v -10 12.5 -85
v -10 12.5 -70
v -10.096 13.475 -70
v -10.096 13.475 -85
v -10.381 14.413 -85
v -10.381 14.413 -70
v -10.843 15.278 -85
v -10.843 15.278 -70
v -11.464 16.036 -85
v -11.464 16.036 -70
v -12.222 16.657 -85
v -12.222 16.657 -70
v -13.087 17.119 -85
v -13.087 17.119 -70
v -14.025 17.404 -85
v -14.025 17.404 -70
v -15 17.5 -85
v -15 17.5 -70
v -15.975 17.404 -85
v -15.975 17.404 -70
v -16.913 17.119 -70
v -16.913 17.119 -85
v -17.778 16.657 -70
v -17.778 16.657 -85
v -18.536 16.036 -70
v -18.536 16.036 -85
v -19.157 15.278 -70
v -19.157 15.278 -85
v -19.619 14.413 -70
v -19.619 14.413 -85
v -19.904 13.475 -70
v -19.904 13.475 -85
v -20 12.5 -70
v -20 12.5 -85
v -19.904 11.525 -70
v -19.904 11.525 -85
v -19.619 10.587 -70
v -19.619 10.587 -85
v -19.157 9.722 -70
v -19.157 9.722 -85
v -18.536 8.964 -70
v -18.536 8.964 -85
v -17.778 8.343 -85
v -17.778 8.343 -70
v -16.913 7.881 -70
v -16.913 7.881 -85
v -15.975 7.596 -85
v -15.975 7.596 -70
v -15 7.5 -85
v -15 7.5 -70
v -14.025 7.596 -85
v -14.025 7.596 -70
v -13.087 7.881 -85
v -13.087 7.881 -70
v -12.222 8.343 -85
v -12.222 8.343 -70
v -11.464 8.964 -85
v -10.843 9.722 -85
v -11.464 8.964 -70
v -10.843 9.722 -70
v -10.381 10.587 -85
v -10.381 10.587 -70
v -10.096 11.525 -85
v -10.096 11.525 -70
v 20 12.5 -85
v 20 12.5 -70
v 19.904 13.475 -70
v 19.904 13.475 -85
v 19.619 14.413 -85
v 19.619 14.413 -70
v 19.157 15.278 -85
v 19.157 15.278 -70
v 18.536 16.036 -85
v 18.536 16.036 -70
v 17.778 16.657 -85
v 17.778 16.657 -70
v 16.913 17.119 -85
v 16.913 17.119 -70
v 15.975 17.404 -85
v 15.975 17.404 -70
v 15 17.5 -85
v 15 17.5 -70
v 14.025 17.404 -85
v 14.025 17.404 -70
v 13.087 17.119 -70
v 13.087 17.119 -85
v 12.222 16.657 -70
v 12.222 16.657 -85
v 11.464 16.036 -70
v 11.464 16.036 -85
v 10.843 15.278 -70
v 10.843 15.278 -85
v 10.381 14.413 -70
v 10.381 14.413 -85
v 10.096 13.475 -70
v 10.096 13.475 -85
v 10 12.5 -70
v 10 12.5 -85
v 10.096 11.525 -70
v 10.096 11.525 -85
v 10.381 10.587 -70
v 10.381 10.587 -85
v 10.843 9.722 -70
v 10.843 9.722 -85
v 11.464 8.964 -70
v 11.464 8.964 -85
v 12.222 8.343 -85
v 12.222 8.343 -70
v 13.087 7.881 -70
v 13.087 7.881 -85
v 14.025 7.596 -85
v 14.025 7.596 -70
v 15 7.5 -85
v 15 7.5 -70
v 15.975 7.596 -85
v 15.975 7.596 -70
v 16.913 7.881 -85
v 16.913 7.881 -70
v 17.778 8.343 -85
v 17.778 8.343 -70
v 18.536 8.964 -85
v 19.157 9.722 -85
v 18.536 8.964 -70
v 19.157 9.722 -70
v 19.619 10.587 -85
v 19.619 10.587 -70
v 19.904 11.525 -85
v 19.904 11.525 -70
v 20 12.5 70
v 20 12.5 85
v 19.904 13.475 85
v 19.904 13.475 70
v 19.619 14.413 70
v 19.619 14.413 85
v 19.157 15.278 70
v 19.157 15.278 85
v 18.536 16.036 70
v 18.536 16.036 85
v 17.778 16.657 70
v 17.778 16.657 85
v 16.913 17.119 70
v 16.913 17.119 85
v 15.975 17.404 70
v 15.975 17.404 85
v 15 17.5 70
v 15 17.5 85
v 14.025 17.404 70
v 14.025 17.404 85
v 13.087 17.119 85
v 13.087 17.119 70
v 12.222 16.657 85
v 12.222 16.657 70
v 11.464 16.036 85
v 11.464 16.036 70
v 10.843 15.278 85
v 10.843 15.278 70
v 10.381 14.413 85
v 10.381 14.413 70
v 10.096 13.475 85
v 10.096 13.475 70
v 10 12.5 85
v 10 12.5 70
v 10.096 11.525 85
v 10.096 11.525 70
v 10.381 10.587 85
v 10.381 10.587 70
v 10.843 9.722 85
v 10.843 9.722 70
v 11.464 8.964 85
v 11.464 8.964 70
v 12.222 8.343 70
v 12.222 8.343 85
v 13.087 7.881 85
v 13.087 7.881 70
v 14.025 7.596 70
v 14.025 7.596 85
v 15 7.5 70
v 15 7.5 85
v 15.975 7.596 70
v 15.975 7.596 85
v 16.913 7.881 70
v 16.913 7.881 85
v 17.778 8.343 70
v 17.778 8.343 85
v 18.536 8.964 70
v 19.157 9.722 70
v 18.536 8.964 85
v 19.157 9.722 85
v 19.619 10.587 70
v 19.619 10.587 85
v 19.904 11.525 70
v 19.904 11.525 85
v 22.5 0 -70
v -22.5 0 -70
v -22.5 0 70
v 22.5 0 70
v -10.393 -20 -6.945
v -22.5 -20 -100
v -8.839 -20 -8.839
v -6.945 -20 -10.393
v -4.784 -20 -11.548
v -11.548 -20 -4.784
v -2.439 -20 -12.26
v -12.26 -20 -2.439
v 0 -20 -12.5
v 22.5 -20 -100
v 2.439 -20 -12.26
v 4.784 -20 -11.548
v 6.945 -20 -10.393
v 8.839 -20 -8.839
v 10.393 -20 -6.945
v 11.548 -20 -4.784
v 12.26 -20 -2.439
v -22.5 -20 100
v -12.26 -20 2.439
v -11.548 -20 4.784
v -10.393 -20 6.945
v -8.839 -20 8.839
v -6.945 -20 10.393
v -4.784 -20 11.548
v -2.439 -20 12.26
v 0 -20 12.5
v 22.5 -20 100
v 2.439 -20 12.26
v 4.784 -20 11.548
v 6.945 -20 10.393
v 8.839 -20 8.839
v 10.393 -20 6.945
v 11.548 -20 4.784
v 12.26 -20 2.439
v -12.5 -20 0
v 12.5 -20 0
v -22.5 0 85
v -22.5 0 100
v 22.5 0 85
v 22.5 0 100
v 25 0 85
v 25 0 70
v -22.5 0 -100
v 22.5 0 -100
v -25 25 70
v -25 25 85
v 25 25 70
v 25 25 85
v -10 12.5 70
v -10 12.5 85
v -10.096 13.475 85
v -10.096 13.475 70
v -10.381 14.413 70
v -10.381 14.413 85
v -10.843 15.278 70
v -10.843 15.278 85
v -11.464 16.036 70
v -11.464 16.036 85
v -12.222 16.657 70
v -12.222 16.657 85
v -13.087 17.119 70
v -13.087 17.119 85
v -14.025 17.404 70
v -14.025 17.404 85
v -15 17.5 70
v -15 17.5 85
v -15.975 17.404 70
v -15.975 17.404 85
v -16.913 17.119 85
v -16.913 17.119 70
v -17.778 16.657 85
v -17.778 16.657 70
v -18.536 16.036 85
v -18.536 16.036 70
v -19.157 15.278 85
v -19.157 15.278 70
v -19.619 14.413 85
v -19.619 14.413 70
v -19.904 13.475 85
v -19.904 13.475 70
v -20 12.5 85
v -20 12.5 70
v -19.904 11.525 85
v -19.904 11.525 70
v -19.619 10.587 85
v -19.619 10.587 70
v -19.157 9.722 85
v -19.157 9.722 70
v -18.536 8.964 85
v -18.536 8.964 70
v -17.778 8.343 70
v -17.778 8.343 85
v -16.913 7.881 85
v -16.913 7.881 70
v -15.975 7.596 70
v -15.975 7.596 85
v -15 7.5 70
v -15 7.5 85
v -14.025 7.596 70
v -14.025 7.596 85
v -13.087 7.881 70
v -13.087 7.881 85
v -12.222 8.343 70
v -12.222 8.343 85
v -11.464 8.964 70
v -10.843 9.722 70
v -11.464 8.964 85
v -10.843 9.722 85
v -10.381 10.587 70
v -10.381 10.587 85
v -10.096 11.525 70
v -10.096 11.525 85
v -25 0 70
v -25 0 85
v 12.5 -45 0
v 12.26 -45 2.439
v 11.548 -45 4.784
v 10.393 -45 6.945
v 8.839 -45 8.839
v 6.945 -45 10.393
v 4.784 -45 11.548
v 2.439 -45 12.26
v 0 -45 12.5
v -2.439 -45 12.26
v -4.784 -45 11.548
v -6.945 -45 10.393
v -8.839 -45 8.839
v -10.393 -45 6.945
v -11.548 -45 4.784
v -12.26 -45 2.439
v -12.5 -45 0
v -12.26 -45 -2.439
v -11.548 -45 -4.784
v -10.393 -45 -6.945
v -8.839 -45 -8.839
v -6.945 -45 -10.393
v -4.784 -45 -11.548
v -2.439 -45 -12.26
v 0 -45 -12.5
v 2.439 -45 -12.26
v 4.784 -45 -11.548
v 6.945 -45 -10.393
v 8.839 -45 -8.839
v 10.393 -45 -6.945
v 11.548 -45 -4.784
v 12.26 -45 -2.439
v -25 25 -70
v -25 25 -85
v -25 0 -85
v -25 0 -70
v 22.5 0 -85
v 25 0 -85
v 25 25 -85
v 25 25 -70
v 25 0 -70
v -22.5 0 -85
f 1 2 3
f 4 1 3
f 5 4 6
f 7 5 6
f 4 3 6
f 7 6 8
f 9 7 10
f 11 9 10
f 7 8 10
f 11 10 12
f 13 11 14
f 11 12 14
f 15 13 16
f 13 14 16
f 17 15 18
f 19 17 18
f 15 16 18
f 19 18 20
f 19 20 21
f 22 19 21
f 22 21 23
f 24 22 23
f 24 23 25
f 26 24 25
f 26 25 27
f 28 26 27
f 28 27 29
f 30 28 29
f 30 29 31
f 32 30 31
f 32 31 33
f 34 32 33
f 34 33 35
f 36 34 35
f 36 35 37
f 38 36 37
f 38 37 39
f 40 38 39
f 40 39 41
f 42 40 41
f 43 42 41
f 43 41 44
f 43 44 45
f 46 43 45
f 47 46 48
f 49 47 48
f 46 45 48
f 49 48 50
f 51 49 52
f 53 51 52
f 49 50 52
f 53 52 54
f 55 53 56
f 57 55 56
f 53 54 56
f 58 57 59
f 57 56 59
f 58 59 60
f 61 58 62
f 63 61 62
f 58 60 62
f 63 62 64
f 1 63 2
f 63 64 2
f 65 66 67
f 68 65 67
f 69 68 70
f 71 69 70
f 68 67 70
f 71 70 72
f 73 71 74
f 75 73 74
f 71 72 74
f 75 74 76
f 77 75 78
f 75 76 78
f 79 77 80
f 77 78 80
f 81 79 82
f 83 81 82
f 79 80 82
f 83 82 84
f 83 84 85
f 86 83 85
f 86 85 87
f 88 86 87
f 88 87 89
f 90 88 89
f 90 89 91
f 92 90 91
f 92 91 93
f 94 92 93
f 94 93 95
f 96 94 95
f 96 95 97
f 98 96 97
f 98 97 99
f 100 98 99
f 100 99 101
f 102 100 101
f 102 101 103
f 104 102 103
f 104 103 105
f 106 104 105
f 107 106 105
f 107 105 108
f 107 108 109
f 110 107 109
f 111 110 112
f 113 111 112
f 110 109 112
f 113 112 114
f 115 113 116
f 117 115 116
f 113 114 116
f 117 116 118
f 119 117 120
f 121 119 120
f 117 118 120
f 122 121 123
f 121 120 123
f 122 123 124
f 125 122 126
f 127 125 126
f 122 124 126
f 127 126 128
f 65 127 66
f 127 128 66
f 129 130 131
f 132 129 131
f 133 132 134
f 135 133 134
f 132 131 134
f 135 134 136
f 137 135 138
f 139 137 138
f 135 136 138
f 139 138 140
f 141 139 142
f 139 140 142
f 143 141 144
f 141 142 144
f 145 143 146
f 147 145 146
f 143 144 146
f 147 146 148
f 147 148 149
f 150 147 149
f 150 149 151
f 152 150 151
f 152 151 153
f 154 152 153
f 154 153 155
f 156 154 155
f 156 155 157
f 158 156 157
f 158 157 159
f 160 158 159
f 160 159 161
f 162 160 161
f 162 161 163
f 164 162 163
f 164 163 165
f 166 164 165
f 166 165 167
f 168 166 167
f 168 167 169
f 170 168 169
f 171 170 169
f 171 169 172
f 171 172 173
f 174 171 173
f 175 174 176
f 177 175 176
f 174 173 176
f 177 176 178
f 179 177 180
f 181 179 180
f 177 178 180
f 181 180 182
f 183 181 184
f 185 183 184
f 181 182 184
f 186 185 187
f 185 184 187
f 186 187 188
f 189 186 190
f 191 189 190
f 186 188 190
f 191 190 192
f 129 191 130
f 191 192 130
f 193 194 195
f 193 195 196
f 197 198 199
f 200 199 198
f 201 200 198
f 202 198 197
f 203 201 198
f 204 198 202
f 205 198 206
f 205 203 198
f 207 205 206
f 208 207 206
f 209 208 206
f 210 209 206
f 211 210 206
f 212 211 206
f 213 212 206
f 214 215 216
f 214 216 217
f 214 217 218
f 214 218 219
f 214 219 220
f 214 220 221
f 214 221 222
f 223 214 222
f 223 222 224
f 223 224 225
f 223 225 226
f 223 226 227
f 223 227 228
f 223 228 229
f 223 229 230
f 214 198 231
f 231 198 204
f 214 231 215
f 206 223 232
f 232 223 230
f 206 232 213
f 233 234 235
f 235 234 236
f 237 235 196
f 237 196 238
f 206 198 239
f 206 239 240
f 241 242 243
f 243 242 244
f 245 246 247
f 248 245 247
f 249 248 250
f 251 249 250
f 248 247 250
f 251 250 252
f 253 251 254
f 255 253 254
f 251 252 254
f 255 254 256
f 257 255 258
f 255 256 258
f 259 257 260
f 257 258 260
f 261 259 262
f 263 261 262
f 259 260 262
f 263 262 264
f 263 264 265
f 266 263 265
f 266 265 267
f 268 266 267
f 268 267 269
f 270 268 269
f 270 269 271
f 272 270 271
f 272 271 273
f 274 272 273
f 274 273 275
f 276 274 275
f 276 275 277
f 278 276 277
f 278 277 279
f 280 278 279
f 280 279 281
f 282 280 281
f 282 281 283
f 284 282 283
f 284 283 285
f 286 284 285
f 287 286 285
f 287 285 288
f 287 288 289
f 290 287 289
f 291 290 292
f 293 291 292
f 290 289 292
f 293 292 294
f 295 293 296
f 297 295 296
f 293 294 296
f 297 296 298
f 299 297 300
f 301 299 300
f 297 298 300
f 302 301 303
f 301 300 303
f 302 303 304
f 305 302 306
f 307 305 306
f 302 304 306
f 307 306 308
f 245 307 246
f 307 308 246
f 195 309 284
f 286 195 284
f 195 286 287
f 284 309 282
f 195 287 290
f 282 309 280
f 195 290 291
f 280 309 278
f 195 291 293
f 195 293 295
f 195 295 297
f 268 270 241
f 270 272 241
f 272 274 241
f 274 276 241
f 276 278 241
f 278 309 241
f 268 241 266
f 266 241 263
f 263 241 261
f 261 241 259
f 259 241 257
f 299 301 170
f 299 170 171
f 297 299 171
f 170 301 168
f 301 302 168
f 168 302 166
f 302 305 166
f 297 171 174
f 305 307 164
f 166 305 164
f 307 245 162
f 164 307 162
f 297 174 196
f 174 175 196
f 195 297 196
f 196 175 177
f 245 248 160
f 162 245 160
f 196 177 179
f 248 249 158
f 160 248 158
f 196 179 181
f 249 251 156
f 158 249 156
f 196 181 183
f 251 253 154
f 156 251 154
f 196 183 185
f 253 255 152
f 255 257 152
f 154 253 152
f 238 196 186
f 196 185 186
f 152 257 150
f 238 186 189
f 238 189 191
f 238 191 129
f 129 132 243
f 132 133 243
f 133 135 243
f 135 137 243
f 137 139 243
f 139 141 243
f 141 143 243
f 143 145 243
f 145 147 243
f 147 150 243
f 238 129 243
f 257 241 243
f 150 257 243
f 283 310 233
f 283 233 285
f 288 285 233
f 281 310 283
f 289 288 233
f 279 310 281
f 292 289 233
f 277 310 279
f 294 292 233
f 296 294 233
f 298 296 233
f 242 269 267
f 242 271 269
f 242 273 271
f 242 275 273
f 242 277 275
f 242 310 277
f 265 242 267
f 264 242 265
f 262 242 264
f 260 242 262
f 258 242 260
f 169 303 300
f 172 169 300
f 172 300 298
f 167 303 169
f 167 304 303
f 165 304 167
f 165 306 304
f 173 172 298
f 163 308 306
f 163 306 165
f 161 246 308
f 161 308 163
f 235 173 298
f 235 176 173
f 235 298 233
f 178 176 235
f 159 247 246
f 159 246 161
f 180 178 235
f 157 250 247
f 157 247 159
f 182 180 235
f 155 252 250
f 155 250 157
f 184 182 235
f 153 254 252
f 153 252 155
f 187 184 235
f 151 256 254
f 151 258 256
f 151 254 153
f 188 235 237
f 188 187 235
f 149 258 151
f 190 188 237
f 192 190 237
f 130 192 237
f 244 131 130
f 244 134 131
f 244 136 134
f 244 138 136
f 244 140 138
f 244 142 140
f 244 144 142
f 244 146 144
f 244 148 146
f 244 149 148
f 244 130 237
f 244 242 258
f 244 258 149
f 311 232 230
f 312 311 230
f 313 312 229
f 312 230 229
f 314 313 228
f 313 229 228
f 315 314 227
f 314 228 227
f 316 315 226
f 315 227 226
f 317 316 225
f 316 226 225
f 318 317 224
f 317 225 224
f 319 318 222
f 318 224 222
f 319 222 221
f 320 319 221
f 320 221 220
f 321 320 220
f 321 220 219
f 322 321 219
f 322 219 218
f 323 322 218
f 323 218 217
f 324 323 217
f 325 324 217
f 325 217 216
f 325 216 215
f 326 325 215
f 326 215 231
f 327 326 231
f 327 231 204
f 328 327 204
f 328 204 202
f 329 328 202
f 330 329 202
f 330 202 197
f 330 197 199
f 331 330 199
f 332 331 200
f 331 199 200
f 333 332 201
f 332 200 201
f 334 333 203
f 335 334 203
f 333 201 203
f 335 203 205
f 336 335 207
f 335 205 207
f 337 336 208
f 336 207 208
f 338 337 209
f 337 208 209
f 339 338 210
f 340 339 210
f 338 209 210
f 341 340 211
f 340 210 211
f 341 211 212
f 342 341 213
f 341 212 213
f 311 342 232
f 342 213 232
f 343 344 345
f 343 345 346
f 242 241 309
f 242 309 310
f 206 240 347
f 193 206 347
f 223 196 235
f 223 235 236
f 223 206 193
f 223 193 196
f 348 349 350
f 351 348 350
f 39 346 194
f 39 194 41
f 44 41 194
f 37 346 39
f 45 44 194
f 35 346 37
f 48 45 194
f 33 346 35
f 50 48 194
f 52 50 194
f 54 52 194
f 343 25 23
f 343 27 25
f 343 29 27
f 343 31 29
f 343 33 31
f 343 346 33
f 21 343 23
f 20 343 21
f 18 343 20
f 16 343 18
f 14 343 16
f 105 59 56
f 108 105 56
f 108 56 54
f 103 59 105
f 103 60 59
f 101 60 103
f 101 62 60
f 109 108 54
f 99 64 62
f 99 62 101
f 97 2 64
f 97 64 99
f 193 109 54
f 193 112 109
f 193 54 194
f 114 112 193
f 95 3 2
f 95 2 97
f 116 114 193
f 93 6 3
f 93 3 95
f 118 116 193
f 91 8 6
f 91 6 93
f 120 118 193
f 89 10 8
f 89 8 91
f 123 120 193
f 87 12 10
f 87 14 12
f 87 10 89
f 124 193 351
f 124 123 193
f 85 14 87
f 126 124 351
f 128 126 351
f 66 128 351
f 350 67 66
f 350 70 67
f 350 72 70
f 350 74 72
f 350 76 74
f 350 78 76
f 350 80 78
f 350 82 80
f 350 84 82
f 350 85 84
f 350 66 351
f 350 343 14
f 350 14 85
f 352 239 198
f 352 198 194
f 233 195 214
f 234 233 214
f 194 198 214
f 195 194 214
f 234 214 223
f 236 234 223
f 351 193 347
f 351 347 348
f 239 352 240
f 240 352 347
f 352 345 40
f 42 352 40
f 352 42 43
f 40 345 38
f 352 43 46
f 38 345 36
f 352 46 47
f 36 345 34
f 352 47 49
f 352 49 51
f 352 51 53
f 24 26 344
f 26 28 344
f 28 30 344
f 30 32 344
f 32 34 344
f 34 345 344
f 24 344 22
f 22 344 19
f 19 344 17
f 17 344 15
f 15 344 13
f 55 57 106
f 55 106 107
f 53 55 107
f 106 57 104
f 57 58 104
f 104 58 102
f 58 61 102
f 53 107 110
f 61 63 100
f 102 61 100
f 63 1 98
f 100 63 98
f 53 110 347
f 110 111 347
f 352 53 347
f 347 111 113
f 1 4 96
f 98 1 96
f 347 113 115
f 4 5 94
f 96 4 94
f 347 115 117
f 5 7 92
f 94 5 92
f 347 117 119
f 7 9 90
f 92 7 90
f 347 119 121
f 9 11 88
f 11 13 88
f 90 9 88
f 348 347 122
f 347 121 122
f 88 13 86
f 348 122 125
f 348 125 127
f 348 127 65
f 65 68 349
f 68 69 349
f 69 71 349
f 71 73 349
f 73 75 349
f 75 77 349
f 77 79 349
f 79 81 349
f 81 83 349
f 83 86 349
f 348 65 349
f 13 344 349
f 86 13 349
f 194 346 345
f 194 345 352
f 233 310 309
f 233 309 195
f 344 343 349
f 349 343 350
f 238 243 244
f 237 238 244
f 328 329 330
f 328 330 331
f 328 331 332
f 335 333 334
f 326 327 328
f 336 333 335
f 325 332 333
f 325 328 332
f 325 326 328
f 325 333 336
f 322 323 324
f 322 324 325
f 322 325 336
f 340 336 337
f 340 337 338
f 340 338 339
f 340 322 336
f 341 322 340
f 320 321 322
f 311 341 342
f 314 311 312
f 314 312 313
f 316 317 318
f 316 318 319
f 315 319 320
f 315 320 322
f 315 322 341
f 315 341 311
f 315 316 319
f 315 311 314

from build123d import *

# Parameters (mm, degrees)
F0_R     = 12.5
F1_DEPTH = 45
F3_W     = 45
F3_H     = 200
F4_DEPTH = 20
F6_W     = 50
F6_H     = 15
F7_DEPTH = 25
F8_R     = 5
F9_DEPTH = 185.001


with BuildPart() as f1:
    # F0 (on Front) → F1 (new body)
    with BuildSketch(Plane.XZ):
        Circle(F0_R)
    extrude(amount=F1_DEPTH)

    # F3 (on offset) → F4 (join)
    with BuildSketch(Plane.XZ.offset(20)):
        Rectangle(F3_W, F3_H)
    extrude(amount=-F4_DEPTH)

    # F6 (on offset) → F7 (join)
    with BuildSketch(Plane.XZ.offset(-25)):
        with Locations((0, 77.5)):
            Rectangle(F6_W, F6_H)
        with Locations((0, -77.5)):
            Rectangle(F6_W, F6_H)
    extrude(amount=F7_DEPTH)

    # F8 (on face) → F9 (cut, through all)
    with BuildSketch(Plane.XY.offset(85)):
        with Locations((15, 12.5)):
            Circle(F8_R)
        with Locations((-15, 12.5)):
            Circle(F8_R)
    extrude(amount=-F9_DEPTH, mode=Mode.SUBTRACT)


solid = f1.part
